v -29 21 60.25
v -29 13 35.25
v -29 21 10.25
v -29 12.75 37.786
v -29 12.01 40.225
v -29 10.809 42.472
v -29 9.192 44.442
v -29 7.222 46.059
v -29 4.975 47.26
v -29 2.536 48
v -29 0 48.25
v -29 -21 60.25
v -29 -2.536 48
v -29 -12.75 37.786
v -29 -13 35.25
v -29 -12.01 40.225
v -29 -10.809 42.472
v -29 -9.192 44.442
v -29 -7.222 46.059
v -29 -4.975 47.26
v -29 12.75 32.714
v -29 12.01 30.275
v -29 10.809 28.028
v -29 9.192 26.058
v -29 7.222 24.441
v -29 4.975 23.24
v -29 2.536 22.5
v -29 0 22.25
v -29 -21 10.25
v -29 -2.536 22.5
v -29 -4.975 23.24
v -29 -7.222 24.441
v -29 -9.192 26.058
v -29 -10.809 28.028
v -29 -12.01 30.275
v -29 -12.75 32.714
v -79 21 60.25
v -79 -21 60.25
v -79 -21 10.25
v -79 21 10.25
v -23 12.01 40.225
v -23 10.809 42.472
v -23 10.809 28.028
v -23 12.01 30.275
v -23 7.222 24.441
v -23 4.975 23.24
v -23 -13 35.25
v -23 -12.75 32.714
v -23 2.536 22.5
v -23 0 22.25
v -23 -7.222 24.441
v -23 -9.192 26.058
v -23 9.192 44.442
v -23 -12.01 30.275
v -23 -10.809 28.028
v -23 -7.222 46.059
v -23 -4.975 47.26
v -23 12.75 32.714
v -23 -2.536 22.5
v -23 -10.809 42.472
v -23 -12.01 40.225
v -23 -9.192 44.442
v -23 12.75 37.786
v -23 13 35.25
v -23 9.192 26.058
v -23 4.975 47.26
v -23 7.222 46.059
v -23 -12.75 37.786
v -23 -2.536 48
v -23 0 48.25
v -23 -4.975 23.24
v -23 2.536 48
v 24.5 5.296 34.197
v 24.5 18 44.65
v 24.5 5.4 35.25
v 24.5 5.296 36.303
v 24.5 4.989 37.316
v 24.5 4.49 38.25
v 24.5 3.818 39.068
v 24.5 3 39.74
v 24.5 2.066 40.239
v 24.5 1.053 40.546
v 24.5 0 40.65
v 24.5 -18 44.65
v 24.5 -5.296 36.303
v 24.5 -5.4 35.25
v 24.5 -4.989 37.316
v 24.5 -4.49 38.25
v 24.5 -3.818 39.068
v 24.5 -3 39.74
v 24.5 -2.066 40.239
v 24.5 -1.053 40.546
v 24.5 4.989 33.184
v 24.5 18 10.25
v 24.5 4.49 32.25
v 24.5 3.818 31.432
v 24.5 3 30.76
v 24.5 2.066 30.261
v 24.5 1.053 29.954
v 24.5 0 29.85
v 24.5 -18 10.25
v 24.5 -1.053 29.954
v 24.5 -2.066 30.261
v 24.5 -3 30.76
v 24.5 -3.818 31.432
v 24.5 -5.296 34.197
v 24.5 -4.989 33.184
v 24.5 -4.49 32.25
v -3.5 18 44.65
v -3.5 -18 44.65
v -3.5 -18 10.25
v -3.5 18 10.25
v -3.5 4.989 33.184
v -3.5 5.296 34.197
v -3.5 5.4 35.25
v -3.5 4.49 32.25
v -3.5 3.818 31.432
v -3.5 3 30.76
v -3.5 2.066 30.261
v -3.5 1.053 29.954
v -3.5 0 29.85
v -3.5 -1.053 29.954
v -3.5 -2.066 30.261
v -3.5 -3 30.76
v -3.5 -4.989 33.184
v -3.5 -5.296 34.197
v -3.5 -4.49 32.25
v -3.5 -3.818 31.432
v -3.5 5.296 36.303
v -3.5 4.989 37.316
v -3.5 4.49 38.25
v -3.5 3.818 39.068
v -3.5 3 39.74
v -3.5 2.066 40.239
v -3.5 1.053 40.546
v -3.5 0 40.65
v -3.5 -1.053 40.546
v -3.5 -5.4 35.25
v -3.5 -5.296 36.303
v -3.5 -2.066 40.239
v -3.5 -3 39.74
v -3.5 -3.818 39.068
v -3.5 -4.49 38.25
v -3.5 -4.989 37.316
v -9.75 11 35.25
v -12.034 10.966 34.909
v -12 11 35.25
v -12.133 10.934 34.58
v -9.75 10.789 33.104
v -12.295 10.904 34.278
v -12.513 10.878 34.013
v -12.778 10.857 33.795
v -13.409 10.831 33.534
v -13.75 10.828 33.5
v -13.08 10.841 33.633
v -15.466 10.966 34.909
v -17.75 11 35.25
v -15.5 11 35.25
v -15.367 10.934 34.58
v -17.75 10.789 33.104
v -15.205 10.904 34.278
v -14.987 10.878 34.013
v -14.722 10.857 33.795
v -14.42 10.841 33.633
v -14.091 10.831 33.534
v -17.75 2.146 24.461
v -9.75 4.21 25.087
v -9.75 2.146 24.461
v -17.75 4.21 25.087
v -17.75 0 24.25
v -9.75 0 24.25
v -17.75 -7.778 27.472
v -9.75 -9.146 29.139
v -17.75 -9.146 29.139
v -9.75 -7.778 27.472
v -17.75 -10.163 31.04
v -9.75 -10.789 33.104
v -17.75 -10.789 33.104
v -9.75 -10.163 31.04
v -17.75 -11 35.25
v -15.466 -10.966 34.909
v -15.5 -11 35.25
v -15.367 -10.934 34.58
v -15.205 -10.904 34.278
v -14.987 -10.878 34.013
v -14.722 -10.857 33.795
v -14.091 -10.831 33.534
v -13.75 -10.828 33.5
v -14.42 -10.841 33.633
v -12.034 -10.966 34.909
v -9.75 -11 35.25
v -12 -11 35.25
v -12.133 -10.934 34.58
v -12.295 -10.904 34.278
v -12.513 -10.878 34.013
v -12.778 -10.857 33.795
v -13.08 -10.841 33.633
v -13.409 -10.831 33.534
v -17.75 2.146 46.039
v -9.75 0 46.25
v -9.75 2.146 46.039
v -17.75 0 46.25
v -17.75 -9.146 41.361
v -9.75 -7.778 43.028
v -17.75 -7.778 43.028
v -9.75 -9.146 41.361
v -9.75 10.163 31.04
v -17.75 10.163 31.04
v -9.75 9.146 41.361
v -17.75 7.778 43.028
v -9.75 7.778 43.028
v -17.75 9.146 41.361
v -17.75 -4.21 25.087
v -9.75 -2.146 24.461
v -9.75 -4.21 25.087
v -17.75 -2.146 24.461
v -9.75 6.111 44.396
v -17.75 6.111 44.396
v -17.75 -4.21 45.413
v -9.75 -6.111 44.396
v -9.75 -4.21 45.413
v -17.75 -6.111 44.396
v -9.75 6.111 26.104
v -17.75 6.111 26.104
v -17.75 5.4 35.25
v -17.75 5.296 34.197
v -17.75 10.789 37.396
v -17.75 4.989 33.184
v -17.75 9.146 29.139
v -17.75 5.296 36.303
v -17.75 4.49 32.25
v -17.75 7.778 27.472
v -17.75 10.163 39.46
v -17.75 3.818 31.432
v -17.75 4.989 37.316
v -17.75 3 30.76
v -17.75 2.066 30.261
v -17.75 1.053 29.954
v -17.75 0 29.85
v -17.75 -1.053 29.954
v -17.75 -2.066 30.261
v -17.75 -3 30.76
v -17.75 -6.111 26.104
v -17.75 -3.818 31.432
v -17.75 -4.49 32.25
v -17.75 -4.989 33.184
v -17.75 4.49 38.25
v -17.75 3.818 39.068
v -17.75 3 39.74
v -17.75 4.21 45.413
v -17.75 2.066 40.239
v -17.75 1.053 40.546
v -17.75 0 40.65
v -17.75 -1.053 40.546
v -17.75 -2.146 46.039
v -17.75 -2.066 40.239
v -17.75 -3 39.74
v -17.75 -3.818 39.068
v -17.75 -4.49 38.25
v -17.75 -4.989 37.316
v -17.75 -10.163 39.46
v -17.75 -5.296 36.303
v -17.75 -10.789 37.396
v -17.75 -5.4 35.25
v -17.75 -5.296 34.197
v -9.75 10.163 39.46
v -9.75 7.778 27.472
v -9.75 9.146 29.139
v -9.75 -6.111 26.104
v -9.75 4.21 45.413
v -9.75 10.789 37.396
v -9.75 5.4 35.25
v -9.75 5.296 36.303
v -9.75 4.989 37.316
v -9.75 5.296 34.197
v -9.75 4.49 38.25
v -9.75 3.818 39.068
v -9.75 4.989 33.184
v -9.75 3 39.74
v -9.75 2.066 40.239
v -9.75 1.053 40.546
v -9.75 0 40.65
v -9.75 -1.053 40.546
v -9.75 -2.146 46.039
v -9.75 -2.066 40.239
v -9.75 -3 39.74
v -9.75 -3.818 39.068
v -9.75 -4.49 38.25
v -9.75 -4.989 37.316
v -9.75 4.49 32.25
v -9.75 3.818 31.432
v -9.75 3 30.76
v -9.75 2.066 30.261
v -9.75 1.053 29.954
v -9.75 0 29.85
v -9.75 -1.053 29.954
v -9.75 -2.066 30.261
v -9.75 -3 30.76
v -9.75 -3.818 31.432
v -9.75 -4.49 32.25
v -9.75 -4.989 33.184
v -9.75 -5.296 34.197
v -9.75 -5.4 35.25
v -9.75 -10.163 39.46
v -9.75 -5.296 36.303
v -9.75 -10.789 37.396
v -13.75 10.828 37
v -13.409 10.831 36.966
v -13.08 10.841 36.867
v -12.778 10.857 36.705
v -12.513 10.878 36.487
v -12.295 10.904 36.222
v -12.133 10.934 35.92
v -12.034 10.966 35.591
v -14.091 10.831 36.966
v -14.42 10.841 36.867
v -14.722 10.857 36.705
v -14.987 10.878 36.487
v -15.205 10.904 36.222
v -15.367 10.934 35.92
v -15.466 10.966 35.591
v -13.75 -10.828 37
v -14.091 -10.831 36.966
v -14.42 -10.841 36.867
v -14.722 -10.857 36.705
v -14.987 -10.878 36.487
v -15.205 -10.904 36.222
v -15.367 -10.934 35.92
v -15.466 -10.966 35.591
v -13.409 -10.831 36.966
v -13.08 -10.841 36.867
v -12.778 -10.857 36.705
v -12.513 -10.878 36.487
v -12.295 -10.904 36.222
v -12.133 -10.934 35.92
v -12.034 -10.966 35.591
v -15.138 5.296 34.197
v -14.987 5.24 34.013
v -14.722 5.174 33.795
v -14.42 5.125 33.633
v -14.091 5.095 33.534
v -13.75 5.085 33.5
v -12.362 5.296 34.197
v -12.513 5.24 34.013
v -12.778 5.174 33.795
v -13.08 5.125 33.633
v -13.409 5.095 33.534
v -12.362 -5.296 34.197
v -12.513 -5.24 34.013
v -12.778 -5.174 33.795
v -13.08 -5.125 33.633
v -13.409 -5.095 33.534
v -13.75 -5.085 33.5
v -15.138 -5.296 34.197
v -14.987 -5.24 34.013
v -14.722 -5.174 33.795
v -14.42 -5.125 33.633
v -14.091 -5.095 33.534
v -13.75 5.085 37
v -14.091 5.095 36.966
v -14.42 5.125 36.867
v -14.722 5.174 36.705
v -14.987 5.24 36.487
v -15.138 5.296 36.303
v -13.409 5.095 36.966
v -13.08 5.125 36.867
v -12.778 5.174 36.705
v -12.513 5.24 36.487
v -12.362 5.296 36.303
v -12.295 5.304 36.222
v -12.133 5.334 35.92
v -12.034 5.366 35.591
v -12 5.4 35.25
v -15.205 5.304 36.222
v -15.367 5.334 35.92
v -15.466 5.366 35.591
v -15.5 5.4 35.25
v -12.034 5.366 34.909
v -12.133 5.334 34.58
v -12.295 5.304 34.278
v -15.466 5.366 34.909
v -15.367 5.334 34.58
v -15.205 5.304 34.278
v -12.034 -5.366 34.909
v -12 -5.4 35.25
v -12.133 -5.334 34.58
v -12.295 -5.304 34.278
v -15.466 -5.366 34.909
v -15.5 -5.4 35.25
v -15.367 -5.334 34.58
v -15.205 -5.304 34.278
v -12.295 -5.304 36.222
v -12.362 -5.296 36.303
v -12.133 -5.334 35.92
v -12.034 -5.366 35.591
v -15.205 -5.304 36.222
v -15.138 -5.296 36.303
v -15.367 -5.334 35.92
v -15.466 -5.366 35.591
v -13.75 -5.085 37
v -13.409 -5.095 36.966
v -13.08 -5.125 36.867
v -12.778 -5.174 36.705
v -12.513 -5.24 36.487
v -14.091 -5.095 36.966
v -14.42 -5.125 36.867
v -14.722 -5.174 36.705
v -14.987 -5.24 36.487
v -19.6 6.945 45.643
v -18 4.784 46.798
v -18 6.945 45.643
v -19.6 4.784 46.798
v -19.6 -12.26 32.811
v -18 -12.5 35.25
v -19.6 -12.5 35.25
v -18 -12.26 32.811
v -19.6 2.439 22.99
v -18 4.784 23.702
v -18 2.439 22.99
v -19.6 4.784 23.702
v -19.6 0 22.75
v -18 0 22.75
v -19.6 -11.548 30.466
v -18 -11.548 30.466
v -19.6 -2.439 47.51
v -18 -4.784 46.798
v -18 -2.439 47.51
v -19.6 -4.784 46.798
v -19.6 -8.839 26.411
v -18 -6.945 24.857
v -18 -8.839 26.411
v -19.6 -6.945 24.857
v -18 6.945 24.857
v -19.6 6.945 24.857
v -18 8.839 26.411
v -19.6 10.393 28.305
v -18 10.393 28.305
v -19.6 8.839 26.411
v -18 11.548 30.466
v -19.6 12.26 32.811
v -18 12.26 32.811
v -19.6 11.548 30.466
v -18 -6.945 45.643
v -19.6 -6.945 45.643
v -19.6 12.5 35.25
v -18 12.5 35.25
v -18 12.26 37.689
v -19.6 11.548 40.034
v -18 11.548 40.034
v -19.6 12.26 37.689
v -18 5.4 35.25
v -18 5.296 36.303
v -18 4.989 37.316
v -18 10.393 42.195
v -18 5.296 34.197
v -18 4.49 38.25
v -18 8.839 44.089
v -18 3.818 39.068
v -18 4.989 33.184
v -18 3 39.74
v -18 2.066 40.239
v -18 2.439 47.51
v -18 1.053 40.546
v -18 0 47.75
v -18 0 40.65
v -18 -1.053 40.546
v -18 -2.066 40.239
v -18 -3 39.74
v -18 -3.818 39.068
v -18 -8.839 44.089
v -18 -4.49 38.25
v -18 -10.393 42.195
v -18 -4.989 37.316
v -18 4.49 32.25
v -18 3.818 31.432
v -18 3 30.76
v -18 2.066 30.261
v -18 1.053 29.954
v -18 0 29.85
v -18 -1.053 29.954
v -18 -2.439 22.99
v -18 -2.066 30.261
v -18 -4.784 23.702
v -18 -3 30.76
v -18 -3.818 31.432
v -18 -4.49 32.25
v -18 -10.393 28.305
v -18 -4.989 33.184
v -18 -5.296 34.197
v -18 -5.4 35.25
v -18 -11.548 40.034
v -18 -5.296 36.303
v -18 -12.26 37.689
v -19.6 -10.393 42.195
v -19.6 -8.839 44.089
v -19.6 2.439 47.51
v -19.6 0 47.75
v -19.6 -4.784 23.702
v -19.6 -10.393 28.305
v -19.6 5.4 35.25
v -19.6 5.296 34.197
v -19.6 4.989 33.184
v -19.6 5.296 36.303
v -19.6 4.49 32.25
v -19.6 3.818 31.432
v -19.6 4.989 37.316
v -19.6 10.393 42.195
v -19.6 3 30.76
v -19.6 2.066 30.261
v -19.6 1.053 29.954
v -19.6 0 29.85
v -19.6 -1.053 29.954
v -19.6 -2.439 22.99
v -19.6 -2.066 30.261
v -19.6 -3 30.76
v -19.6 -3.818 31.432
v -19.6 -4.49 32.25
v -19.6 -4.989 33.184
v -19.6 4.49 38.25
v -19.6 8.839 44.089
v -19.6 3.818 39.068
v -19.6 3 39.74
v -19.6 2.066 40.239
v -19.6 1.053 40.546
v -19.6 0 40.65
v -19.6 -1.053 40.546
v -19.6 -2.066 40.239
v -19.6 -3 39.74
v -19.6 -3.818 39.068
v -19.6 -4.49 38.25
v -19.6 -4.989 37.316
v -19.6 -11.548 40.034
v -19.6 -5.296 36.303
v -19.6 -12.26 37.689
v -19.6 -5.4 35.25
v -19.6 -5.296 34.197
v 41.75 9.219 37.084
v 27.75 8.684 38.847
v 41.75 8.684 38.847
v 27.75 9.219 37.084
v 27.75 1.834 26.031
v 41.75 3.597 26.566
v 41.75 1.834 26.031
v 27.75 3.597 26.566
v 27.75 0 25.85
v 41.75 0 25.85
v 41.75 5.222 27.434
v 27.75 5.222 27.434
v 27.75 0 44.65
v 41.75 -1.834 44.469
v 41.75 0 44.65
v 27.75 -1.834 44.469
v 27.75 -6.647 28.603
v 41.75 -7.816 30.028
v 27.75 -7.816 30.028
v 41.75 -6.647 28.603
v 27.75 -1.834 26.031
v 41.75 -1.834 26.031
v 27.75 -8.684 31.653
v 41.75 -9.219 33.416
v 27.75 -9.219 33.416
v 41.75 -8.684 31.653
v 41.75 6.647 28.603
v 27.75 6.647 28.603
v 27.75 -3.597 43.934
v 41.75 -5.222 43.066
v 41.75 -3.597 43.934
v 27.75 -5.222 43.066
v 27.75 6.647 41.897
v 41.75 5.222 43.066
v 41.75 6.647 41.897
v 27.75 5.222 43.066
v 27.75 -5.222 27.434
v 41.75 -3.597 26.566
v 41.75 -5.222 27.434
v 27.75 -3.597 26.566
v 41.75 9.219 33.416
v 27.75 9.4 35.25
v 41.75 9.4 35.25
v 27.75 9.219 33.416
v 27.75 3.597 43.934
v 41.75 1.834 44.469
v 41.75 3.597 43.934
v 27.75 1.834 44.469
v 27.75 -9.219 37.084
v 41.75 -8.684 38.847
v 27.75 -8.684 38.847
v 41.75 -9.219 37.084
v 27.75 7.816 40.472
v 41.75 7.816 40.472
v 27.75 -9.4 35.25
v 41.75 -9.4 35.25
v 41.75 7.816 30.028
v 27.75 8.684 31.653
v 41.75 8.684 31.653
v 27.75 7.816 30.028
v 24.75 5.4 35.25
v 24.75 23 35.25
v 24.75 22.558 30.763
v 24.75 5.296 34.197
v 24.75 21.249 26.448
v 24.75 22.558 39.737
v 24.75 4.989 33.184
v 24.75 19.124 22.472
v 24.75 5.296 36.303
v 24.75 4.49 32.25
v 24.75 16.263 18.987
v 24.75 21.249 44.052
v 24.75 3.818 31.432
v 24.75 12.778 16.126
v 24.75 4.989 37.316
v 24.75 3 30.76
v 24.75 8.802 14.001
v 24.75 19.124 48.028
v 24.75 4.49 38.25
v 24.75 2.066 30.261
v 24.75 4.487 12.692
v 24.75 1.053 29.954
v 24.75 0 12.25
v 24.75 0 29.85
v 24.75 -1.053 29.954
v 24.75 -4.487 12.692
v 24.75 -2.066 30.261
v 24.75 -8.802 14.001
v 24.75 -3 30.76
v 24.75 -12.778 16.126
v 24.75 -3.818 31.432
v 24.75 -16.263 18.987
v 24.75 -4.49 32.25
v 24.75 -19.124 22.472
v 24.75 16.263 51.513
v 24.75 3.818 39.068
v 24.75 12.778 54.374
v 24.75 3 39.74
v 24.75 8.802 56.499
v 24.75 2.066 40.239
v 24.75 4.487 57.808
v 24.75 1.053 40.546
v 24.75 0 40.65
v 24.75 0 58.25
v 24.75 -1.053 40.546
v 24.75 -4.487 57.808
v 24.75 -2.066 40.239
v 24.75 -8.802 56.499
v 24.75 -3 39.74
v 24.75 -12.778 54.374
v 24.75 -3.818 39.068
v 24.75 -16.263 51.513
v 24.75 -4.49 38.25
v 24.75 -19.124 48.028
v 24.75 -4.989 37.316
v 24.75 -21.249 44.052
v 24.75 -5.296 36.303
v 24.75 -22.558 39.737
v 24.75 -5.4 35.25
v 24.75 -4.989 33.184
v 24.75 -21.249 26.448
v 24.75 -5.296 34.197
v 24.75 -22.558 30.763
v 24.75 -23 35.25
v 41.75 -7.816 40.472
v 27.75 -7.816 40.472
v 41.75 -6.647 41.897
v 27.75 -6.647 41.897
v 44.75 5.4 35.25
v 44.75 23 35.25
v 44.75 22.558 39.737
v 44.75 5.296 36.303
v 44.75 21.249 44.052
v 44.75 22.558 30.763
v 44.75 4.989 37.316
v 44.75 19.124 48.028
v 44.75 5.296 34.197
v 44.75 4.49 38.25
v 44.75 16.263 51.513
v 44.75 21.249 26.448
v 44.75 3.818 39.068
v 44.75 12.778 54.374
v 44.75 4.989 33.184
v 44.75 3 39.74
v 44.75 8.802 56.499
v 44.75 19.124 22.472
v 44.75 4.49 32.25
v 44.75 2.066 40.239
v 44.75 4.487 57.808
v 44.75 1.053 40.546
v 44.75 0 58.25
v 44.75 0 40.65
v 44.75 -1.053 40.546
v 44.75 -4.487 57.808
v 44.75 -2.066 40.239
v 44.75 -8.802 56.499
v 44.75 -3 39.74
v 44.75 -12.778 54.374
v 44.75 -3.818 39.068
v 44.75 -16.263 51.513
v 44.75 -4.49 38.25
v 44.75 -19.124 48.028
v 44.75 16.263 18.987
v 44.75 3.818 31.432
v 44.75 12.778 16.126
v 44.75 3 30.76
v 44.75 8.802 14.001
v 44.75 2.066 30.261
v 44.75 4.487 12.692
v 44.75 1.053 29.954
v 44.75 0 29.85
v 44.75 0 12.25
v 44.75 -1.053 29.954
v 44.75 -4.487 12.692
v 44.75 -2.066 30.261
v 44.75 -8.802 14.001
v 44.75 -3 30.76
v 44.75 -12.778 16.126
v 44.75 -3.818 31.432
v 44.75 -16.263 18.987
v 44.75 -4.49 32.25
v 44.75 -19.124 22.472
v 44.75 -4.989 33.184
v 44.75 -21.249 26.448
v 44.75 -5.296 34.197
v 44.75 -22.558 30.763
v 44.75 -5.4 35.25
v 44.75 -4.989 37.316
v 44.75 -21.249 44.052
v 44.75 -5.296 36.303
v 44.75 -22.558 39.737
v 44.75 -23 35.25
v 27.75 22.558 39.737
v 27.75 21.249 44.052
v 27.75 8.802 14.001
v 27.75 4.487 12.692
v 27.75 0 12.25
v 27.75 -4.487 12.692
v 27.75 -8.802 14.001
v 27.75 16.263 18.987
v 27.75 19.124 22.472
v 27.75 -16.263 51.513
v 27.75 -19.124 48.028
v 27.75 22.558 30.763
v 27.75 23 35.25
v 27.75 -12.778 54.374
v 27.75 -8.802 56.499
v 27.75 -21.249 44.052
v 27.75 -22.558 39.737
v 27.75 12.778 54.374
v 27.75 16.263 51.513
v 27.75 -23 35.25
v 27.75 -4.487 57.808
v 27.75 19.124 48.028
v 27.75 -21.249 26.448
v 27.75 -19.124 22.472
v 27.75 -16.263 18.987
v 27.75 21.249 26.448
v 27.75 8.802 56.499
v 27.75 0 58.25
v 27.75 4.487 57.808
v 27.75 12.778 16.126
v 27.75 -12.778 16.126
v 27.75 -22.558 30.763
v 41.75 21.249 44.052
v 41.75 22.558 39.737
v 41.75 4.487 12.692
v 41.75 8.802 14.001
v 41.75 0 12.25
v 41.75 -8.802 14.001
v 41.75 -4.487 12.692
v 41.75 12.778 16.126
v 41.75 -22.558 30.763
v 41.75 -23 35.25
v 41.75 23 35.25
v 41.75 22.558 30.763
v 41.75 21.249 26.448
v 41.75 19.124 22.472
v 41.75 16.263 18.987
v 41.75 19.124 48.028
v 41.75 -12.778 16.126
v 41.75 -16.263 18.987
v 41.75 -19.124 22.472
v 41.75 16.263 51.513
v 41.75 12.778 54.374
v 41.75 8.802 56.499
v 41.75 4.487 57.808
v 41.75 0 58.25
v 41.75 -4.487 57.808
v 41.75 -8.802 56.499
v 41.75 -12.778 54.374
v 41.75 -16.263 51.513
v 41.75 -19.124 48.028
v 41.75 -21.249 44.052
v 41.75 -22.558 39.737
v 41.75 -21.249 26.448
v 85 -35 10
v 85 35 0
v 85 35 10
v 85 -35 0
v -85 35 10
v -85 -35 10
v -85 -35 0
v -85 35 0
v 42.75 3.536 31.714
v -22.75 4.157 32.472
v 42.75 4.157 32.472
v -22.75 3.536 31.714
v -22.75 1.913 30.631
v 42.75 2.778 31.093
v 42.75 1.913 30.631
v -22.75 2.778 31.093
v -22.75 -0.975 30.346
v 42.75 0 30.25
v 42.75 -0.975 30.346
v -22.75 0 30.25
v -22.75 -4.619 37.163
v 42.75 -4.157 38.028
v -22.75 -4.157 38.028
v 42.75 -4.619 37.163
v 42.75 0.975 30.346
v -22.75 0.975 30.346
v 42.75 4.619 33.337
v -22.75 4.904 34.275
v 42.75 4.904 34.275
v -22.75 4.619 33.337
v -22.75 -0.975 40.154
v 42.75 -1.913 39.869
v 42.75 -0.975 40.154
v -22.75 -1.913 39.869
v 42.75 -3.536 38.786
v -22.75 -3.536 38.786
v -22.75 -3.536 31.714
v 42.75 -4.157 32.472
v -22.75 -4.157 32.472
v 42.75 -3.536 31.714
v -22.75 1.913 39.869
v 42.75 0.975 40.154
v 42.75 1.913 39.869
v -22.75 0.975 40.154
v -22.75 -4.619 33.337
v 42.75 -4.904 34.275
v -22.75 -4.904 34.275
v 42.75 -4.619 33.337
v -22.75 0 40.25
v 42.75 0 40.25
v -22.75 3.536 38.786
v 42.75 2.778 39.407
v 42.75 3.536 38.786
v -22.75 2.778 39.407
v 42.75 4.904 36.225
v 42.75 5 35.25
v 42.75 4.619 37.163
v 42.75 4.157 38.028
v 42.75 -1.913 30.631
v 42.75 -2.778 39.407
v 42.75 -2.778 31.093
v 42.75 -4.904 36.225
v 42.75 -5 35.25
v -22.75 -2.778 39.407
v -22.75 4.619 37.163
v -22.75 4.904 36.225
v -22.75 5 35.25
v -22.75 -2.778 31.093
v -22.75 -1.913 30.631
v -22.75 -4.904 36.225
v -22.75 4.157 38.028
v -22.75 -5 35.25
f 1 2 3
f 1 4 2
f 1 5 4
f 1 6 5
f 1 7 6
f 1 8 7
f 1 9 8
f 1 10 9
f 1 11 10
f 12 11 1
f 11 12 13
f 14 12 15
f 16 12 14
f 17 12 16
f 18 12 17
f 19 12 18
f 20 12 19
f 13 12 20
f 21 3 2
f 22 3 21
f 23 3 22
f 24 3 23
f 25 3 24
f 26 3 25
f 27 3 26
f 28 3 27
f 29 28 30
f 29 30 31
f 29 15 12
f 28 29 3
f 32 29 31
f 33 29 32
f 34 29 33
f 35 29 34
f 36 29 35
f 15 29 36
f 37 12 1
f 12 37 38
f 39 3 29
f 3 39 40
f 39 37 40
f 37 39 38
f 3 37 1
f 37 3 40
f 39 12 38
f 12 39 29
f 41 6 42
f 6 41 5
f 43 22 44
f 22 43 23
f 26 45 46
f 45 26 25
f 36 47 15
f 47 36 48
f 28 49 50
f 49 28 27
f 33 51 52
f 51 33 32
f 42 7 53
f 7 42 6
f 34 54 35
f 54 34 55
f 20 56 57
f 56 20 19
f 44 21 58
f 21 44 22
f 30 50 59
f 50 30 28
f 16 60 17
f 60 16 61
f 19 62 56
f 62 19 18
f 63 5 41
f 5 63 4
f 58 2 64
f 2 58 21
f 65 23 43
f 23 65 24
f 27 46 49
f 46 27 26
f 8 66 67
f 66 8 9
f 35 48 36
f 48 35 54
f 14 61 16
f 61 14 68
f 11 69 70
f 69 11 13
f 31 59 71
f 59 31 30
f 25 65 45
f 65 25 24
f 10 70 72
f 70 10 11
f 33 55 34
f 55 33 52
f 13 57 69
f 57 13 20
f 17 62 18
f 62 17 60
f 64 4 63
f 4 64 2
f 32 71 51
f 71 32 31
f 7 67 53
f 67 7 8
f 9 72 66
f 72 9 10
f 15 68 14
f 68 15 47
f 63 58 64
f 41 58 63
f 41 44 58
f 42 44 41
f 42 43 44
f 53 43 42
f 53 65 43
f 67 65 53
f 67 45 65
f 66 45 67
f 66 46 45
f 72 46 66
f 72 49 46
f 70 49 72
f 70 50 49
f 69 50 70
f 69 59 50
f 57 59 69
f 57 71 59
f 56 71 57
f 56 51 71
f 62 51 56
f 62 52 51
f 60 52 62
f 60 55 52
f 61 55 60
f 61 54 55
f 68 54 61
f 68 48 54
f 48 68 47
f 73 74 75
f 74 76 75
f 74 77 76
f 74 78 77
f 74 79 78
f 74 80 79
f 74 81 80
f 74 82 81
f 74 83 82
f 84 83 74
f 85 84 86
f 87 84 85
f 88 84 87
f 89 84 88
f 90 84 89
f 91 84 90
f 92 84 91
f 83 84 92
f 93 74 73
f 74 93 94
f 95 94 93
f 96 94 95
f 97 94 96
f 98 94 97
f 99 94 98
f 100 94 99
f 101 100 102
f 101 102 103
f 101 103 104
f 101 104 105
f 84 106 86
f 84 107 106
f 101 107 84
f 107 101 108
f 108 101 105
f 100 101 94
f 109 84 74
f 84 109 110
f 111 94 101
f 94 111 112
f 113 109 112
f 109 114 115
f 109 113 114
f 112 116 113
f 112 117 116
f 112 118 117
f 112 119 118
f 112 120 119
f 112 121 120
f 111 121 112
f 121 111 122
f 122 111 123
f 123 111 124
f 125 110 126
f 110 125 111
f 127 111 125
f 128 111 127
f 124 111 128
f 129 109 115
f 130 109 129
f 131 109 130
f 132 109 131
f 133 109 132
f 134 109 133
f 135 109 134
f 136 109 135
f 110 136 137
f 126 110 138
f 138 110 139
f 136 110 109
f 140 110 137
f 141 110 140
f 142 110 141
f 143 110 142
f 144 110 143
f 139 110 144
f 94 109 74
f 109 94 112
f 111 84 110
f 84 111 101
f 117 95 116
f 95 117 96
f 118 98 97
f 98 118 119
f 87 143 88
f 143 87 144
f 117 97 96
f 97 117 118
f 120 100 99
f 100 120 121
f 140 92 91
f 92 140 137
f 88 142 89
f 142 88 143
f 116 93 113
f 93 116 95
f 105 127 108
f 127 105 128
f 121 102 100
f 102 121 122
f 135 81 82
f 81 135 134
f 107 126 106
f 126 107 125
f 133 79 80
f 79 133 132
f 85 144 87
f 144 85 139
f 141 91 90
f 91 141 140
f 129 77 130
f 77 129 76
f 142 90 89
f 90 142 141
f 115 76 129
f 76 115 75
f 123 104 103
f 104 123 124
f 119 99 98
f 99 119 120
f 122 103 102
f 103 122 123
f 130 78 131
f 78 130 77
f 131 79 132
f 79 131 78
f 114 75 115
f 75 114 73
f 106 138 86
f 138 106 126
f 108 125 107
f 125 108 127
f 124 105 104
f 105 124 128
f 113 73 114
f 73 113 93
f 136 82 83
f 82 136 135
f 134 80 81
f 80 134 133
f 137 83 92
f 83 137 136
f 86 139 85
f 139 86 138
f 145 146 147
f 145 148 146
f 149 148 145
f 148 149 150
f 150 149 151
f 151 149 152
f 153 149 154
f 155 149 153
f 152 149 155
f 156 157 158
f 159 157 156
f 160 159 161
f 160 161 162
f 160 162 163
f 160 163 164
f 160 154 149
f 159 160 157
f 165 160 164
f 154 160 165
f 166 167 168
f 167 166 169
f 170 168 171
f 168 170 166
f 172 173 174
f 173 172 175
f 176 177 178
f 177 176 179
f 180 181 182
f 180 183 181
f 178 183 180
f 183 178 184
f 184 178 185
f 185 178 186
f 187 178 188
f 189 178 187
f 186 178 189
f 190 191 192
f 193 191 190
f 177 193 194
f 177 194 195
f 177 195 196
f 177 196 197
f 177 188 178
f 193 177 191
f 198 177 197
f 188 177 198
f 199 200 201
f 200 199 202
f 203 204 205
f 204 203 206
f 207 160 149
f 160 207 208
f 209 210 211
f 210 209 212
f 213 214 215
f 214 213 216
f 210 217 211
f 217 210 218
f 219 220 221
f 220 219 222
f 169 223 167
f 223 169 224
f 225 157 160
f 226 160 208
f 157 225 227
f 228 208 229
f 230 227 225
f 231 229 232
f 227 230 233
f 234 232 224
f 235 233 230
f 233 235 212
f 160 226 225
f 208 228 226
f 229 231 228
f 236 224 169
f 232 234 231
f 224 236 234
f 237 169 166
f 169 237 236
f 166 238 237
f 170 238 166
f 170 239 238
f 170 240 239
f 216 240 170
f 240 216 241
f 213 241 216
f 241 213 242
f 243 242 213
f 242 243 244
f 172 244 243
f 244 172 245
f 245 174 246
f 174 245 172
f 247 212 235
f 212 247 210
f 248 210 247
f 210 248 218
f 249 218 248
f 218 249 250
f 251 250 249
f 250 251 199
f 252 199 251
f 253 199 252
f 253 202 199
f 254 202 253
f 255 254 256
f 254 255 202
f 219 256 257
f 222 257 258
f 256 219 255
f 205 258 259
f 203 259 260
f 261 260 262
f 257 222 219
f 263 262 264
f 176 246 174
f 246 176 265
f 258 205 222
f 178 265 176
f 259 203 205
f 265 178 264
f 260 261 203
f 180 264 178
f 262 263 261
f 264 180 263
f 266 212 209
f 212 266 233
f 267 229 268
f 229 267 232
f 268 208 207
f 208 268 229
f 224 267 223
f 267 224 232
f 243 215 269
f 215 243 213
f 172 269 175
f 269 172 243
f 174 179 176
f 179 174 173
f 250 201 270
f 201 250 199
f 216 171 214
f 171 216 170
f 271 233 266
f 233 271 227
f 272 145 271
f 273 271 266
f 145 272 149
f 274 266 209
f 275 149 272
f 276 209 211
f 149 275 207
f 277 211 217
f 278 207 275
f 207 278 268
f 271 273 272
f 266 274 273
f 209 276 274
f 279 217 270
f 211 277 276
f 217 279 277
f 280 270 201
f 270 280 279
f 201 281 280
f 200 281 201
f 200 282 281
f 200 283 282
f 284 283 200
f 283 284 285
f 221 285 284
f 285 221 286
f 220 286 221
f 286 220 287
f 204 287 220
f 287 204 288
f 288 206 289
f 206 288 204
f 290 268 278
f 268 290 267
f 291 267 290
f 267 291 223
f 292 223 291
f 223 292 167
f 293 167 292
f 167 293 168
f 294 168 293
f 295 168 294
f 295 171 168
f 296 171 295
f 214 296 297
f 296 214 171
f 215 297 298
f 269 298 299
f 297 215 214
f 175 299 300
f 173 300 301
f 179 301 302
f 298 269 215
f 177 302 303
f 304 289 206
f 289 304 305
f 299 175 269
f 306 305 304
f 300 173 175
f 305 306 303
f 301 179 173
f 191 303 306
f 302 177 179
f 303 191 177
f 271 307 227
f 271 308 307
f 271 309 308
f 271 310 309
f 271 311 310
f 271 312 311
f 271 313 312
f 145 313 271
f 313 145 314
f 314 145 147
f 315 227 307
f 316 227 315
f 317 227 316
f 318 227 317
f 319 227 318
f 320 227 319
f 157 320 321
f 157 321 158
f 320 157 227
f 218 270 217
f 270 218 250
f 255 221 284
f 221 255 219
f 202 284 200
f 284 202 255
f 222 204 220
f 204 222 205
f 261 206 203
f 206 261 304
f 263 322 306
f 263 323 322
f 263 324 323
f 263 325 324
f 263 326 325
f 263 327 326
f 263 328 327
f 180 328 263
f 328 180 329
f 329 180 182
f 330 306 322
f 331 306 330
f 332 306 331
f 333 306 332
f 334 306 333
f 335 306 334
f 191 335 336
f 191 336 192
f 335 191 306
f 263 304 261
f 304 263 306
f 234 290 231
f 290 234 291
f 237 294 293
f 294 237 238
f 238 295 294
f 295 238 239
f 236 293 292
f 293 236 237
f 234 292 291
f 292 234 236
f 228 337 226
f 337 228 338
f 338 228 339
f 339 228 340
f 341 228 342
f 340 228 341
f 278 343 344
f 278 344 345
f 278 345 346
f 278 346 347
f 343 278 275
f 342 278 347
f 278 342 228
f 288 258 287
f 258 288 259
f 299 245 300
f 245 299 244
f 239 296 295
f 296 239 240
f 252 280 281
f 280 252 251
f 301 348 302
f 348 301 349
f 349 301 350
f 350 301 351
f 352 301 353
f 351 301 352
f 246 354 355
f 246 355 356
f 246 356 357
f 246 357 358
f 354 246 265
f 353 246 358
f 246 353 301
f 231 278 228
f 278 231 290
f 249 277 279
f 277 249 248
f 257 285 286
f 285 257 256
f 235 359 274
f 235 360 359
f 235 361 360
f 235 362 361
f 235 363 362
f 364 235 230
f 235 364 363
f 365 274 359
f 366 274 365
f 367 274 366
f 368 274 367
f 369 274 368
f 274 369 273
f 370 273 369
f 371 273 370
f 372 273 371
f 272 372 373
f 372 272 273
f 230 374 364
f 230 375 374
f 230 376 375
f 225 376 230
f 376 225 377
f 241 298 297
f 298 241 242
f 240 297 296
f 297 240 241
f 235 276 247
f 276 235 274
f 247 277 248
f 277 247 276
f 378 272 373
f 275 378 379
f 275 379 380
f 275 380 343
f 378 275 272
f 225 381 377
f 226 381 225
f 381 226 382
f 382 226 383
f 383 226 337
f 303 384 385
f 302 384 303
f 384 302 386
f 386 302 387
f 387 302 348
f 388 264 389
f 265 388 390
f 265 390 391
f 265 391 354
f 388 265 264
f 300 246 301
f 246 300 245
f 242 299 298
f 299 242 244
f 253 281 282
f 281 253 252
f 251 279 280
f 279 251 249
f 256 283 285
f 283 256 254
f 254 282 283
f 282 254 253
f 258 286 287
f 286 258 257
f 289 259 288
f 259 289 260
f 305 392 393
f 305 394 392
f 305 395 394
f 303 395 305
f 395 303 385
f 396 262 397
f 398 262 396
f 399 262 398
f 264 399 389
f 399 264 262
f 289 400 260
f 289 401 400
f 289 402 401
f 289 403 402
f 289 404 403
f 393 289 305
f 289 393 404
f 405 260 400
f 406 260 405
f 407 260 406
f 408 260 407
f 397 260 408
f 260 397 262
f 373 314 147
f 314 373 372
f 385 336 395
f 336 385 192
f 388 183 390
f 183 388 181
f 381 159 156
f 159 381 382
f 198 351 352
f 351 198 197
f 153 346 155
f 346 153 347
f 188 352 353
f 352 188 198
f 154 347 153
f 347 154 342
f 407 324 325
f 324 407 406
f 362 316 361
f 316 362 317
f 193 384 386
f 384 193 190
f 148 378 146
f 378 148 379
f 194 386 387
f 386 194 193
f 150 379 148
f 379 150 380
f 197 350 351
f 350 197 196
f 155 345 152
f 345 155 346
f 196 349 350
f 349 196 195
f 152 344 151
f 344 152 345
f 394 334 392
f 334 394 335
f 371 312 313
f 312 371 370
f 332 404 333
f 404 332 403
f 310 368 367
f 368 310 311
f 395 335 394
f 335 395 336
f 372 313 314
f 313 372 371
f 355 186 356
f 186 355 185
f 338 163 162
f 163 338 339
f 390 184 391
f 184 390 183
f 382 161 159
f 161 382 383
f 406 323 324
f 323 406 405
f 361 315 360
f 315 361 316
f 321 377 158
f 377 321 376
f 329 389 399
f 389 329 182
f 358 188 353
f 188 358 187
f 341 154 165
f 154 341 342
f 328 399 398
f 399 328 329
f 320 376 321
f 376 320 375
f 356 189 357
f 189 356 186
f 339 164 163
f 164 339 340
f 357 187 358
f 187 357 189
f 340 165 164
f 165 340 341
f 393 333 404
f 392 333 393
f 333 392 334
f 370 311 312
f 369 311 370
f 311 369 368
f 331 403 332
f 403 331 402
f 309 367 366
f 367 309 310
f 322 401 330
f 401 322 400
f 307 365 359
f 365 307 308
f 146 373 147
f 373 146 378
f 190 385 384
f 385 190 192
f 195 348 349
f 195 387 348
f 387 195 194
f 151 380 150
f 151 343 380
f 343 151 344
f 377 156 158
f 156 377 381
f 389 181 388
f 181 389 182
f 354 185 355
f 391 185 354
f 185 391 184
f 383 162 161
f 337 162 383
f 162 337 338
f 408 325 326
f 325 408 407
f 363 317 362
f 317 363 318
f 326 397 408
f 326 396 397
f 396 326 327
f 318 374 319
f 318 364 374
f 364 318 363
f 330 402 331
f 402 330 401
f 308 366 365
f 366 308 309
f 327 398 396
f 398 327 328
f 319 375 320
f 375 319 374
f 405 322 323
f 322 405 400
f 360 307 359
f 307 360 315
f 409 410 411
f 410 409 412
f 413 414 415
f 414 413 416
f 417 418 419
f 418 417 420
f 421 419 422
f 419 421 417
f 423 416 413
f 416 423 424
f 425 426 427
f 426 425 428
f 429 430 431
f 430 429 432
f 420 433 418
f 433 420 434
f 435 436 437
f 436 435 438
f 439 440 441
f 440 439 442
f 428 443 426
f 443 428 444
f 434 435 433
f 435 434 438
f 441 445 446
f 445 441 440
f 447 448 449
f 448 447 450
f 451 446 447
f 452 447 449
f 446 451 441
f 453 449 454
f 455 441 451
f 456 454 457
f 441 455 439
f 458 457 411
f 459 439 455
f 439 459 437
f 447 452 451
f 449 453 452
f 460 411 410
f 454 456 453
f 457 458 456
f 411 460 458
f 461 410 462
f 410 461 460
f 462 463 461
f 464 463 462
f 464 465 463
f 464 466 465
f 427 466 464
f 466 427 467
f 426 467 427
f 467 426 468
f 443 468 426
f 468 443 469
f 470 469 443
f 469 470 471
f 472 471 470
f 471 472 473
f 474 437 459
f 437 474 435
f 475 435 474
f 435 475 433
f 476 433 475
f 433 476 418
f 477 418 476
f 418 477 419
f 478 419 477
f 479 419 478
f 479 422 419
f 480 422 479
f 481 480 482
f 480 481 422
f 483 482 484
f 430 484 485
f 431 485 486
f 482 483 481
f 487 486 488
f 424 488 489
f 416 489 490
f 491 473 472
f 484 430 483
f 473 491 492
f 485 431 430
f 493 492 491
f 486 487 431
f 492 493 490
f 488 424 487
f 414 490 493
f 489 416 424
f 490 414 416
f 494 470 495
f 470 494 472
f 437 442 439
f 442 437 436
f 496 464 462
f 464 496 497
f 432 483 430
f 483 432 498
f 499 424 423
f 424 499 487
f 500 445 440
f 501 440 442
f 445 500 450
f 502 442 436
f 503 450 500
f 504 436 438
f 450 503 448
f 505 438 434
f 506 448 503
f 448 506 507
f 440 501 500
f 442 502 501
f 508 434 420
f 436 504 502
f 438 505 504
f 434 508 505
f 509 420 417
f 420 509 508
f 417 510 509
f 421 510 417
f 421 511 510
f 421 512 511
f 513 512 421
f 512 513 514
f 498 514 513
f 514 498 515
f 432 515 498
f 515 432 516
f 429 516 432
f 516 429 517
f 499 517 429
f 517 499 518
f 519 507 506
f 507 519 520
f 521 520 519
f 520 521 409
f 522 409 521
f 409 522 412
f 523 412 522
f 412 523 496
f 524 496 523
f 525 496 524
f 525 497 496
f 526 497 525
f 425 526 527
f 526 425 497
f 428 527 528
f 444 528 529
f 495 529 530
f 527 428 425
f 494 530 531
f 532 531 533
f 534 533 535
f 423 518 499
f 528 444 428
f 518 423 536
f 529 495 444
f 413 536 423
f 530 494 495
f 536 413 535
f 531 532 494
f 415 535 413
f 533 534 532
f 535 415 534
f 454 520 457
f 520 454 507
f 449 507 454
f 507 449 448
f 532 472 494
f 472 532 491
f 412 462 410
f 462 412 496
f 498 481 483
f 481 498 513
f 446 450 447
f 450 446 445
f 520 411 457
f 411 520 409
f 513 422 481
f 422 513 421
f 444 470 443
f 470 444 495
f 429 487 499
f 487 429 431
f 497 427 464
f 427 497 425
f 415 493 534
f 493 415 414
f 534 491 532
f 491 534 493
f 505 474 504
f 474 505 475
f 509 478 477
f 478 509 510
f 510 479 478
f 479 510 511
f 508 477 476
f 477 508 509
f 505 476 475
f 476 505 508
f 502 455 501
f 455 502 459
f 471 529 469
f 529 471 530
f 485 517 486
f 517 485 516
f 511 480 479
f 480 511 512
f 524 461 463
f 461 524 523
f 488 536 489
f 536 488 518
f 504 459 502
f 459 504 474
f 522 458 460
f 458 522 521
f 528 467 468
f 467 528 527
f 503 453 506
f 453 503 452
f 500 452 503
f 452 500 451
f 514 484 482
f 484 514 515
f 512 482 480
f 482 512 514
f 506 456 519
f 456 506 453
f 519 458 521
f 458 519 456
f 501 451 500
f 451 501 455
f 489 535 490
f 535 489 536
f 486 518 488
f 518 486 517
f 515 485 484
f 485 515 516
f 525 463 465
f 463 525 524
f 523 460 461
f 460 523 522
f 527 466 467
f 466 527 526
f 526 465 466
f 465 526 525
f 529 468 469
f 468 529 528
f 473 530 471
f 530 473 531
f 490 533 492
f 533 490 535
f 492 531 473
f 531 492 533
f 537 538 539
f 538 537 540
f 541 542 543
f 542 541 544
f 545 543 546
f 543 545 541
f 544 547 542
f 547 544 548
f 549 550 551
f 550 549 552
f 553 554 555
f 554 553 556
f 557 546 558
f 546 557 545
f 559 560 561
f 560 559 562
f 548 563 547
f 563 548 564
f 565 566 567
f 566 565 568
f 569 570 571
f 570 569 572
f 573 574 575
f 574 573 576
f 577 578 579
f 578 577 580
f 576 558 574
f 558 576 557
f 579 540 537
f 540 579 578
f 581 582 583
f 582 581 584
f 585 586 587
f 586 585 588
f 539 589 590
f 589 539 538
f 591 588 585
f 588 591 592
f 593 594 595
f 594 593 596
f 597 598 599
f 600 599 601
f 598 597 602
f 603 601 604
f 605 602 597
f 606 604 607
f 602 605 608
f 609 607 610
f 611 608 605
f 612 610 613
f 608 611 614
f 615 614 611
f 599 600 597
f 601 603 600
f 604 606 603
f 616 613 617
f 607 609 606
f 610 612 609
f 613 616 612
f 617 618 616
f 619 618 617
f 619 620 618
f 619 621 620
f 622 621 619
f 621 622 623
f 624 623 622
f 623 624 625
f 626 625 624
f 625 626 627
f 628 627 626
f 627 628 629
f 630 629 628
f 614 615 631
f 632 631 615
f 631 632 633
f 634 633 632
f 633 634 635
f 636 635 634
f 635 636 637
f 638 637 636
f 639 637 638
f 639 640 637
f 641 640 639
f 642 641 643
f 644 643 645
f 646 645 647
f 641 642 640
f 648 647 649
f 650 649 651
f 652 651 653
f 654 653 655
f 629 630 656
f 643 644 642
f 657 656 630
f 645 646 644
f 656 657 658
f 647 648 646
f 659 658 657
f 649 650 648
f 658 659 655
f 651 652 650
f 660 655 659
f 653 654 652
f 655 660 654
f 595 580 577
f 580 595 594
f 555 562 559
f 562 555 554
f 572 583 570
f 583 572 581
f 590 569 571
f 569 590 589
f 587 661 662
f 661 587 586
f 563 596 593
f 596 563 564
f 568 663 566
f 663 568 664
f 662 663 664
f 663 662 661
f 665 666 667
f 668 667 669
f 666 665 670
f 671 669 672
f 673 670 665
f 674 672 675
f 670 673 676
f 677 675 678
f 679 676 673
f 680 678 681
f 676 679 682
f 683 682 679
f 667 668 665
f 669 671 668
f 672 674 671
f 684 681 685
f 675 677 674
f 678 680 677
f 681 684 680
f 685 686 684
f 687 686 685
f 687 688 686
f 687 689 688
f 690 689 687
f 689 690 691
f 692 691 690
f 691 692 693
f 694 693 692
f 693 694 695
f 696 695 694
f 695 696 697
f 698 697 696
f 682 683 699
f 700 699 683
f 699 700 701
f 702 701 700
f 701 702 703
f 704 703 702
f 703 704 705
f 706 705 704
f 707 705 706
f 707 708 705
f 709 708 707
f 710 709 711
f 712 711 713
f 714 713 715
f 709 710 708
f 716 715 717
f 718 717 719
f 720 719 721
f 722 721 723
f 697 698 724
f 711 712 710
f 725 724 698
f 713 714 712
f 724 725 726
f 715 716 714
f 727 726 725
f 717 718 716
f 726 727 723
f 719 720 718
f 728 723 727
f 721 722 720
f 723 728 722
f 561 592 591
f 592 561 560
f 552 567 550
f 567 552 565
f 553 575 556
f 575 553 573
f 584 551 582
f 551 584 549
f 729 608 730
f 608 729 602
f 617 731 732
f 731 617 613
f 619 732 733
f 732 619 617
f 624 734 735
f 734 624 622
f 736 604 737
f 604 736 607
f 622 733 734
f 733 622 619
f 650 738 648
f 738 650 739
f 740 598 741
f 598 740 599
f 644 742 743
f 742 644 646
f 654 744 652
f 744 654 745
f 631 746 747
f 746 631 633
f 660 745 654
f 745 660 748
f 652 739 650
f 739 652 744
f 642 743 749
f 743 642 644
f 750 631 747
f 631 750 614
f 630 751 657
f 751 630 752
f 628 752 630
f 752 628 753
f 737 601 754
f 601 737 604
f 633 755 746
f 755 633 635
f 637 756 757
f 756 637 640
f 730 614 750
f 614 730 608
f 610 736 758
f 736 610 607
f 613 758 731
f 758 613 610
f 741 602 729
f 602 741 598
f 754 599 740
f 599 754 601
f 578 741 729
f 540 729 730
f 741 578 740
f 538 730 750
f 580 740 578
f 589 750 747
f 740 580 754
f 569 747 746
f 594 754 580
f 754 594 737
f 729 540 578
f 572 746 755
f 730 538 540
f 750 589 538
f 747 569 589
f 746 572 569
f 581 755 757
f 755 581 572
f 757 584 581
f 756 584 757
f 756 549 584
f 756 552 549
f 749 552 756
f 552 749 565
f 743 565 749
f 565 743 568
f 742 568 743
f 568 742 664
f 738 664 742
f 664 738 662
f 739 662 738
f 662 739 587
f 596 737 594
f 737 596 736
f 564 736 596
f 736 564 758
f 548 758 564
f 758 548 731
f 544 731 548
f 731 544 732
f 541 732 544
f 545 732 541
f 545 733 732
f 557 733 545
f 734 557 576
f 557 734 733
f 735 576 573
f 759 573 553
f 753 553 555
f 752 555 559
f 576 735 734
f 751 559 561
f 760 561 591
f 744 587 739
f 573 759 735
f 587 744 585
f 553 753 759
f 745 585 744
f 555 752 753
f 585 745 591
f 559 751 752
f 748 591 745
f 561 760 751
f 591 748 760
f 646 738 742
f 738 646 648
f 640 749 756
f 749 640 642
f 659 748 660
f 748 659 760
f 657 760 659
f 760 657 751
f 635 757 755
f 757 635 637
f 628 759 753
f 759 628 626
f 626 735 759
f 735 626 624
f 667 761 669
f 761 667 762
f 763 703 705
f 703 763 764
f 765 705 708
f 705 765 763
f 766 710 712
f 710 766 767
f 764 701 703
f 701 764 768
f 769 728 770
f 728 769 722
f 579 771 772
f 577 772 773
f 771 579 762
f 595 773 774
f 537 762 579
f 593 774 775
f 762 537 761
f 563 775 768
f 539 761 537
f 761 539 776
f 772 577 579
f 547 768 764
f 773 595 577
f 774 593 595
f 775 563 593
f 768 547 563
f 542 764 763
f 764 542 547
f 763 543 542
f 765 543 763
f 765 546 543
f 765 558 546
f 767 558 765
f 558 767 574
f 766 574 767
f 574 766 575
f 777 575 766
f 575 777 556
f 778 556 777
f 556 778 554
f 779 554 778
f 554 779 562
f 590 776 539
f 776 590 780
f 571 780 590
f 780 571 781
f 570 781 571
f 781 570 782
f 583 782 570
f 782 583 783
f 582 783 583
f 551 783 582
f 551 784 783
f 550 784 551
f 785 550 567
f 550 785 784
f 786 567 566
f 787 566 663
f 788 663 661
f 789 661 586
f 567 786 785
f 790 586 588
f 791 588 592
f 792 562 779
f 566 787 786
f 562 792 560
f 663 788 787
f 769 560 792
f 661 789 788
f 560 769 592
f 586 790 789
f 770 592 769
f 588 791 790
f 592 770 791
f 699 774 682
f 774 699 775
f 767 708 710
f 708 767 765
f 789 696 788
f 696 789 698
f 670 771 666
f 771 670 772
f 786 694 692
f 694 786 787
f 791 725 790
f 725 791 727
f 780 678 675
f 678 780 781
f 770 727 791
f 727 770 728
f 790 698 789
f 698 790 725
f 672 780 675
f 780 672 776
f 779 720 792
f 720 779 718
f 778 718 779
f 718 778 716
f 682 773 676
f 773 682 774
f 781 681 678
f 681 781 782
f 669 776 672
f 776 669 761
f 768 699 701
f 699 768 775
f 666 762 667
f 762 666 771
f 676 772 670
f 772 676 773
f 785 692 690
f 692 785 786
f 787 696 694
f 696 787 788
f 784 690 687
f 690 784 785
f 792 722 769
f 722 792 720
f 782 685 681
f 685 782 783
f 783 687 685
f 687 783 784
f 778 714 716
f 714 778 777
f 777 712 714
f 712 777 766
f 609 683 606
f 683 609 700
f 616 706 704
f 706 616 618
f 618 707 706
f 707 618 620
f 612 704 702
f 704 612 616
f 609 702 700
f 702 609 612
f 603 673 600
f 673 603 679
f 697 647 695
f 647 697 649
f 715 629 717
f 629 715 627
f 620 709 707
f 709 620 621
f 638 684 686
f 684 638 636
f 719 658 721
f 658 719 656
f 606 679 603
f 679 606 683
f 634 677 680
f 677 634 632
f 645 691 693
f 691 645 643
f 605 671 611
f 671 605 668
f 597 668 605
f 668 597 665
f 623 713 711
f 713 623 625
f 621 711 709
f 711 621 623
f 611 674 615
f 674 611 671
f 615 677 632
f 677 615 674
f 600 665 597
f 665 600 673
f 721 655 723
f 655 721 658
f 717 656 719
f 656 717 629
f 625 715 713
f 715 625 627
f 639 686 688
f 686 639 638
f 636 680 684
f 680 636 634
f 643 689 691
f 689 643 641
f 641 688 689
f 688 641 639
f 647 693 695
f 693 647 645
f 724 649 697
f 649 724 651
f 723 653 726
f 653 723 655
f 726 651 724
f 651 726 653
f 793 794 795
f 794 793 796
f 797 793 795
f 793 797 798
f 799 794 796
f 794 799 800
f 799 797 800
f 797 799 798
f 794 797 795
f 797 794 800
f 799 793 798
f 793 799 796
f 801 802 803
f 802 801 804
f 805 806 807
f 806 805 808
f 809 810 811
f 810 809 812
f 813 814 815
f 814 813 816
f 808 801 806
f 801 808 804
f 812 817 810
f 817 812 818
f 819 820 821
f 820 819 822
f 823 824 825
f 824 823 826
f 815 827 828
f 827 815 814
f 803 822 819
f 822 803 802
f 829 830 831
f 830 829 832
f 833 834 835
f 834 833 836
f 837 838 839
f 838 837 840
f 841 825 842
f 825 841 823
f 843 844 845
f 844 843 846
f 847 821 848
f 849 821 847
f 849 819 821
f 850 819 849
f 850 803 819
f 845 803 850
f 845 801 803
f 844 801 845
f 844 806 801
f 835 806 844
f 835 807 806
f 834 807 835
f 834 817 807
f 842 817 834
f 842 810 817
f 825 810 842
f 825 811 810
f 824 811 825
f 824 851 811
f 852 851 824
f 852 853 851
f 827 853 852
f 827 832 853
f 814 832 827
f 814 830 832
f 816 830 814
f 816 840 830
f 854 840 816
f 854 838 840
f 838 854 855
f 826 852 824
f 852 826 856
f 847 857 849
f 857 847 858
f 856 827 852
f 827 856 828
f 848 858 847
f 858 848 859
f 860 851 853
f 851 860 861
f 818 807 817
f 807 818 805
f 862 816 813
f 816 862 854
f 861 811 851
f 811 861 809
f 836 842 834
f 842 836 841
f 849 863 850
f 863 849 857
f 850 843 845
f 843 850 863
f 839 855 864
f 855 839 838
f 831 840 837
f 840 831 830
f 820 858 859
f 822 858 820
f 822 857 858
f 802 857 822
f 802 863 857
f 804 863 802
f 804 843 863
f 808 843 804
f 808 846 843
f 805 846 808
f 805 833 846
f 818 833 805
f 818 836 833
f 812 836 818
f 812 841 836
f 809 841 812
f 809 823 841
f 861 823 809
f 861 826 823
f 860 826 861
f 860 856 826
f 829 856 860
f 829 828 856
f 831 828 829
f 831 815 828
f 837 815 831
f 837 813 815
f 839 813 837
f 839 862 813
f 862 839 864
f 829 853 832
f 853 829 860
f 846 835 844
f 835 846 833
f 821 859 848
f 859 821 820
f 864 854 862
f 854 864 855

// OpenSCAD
$fn = 32;

// ------------------------------------------------------------------------
// Motor drive station: motor 50 x 50 mm, shaft d10, pulley d46
// Every part is its own module, assembly() places every instance.
// ------------------------------------------------------------------------

// --- part 1 ---
module station_bed() {
  difference() {
    translate([-85, -35, 0]) cube([170, 70, 10]);
  }
}

// --- part 2 ---
module drive_motor() {
  union() {
    translate([-25, -21, 0]) cube([50, 42, 50]);
    translate([28, 0, 25]) rotate([0, 90, 0]) cylinder(h = 6, d = 26, center = true);
  }
}

// --- part 3 ---
module pillow_block() {
  difference() {
    translate([-14, -18, 0]) cube([28, 36, 34.4]);
    translate([0, 0, 25]) rotate([0, 90, 0]) cylinder(h = 30, d = 10.8, center = true);
  }
}

// --- part 4 ---
module drive_shaft() {
  translate([0, 0, -32.75]) cylinder(h = 65.5, d = 10);
}

// --- part 5 ---
module shaft_collar() {
  difference() {
    cylinder(h = 8, d = 22);
    translate([0, 0, -1]) cylinder(h = 10, d = 10.8);
    translate([0, 0, 4]) rotate([90, 0, 0]) cylinder(h = 24, d = 3.5, center = true);
  }
}

// --- part 6 ---
module collar_washer() {
  difference() {
      translate([0, 0, 0]) cylinder(h = 1.6, d = 25);
      translate([0, 0, -1]) cylinder(h = 3.6, d = 10.8);
    }
}

// --- part 7 ---
module drive_pulley() {
  difference() {
    union() {
      cylinder(h = 20, d = 18.8);
      cylinder(h = 3, d = 46);
      translate([0, 0, 17]) cylinder(h = 3, d = 46);
    }
    translate([0, 0, -1]) cylinder(h = 22, d = 10.8);
  }
}

// --- assembly ---
module assembly() {
  color([0.80, 0.24, 0.20]) translate([0, 0, 0]) rotate([0, 0, 0]) station_bed();
  color([0.20, 0.45, 0.75]) translate([-54, 0, 10.25]) rotate([0, 0, 0]) drive_motor();
  color([0.25, 0.62, 0.32]) translate([10.5, 0, 10.25]) rotate([0, 0, 0]) pillow_block();
  color([0.92, 0.70, 0.18]) translate([10, 0, 35.25]) rotate([0, 90, 0]) drive_shaft();
  color([0.58, 0.35, 0.70]) translate([-17.75, 0, 35.25]) rotate([0, 90, 0]) shaft_collar();
  color([0.16, 0.66, 0.66]) translate([-19.6, 0, 35.25]) rotate([0, 90, 0]) collar_washer();
  color([0.85, 0.48, 0.18]) translate([24.75, 0, 35.25]) rotate([0, 90, 0]) drive_pulley();
}

assembly();
